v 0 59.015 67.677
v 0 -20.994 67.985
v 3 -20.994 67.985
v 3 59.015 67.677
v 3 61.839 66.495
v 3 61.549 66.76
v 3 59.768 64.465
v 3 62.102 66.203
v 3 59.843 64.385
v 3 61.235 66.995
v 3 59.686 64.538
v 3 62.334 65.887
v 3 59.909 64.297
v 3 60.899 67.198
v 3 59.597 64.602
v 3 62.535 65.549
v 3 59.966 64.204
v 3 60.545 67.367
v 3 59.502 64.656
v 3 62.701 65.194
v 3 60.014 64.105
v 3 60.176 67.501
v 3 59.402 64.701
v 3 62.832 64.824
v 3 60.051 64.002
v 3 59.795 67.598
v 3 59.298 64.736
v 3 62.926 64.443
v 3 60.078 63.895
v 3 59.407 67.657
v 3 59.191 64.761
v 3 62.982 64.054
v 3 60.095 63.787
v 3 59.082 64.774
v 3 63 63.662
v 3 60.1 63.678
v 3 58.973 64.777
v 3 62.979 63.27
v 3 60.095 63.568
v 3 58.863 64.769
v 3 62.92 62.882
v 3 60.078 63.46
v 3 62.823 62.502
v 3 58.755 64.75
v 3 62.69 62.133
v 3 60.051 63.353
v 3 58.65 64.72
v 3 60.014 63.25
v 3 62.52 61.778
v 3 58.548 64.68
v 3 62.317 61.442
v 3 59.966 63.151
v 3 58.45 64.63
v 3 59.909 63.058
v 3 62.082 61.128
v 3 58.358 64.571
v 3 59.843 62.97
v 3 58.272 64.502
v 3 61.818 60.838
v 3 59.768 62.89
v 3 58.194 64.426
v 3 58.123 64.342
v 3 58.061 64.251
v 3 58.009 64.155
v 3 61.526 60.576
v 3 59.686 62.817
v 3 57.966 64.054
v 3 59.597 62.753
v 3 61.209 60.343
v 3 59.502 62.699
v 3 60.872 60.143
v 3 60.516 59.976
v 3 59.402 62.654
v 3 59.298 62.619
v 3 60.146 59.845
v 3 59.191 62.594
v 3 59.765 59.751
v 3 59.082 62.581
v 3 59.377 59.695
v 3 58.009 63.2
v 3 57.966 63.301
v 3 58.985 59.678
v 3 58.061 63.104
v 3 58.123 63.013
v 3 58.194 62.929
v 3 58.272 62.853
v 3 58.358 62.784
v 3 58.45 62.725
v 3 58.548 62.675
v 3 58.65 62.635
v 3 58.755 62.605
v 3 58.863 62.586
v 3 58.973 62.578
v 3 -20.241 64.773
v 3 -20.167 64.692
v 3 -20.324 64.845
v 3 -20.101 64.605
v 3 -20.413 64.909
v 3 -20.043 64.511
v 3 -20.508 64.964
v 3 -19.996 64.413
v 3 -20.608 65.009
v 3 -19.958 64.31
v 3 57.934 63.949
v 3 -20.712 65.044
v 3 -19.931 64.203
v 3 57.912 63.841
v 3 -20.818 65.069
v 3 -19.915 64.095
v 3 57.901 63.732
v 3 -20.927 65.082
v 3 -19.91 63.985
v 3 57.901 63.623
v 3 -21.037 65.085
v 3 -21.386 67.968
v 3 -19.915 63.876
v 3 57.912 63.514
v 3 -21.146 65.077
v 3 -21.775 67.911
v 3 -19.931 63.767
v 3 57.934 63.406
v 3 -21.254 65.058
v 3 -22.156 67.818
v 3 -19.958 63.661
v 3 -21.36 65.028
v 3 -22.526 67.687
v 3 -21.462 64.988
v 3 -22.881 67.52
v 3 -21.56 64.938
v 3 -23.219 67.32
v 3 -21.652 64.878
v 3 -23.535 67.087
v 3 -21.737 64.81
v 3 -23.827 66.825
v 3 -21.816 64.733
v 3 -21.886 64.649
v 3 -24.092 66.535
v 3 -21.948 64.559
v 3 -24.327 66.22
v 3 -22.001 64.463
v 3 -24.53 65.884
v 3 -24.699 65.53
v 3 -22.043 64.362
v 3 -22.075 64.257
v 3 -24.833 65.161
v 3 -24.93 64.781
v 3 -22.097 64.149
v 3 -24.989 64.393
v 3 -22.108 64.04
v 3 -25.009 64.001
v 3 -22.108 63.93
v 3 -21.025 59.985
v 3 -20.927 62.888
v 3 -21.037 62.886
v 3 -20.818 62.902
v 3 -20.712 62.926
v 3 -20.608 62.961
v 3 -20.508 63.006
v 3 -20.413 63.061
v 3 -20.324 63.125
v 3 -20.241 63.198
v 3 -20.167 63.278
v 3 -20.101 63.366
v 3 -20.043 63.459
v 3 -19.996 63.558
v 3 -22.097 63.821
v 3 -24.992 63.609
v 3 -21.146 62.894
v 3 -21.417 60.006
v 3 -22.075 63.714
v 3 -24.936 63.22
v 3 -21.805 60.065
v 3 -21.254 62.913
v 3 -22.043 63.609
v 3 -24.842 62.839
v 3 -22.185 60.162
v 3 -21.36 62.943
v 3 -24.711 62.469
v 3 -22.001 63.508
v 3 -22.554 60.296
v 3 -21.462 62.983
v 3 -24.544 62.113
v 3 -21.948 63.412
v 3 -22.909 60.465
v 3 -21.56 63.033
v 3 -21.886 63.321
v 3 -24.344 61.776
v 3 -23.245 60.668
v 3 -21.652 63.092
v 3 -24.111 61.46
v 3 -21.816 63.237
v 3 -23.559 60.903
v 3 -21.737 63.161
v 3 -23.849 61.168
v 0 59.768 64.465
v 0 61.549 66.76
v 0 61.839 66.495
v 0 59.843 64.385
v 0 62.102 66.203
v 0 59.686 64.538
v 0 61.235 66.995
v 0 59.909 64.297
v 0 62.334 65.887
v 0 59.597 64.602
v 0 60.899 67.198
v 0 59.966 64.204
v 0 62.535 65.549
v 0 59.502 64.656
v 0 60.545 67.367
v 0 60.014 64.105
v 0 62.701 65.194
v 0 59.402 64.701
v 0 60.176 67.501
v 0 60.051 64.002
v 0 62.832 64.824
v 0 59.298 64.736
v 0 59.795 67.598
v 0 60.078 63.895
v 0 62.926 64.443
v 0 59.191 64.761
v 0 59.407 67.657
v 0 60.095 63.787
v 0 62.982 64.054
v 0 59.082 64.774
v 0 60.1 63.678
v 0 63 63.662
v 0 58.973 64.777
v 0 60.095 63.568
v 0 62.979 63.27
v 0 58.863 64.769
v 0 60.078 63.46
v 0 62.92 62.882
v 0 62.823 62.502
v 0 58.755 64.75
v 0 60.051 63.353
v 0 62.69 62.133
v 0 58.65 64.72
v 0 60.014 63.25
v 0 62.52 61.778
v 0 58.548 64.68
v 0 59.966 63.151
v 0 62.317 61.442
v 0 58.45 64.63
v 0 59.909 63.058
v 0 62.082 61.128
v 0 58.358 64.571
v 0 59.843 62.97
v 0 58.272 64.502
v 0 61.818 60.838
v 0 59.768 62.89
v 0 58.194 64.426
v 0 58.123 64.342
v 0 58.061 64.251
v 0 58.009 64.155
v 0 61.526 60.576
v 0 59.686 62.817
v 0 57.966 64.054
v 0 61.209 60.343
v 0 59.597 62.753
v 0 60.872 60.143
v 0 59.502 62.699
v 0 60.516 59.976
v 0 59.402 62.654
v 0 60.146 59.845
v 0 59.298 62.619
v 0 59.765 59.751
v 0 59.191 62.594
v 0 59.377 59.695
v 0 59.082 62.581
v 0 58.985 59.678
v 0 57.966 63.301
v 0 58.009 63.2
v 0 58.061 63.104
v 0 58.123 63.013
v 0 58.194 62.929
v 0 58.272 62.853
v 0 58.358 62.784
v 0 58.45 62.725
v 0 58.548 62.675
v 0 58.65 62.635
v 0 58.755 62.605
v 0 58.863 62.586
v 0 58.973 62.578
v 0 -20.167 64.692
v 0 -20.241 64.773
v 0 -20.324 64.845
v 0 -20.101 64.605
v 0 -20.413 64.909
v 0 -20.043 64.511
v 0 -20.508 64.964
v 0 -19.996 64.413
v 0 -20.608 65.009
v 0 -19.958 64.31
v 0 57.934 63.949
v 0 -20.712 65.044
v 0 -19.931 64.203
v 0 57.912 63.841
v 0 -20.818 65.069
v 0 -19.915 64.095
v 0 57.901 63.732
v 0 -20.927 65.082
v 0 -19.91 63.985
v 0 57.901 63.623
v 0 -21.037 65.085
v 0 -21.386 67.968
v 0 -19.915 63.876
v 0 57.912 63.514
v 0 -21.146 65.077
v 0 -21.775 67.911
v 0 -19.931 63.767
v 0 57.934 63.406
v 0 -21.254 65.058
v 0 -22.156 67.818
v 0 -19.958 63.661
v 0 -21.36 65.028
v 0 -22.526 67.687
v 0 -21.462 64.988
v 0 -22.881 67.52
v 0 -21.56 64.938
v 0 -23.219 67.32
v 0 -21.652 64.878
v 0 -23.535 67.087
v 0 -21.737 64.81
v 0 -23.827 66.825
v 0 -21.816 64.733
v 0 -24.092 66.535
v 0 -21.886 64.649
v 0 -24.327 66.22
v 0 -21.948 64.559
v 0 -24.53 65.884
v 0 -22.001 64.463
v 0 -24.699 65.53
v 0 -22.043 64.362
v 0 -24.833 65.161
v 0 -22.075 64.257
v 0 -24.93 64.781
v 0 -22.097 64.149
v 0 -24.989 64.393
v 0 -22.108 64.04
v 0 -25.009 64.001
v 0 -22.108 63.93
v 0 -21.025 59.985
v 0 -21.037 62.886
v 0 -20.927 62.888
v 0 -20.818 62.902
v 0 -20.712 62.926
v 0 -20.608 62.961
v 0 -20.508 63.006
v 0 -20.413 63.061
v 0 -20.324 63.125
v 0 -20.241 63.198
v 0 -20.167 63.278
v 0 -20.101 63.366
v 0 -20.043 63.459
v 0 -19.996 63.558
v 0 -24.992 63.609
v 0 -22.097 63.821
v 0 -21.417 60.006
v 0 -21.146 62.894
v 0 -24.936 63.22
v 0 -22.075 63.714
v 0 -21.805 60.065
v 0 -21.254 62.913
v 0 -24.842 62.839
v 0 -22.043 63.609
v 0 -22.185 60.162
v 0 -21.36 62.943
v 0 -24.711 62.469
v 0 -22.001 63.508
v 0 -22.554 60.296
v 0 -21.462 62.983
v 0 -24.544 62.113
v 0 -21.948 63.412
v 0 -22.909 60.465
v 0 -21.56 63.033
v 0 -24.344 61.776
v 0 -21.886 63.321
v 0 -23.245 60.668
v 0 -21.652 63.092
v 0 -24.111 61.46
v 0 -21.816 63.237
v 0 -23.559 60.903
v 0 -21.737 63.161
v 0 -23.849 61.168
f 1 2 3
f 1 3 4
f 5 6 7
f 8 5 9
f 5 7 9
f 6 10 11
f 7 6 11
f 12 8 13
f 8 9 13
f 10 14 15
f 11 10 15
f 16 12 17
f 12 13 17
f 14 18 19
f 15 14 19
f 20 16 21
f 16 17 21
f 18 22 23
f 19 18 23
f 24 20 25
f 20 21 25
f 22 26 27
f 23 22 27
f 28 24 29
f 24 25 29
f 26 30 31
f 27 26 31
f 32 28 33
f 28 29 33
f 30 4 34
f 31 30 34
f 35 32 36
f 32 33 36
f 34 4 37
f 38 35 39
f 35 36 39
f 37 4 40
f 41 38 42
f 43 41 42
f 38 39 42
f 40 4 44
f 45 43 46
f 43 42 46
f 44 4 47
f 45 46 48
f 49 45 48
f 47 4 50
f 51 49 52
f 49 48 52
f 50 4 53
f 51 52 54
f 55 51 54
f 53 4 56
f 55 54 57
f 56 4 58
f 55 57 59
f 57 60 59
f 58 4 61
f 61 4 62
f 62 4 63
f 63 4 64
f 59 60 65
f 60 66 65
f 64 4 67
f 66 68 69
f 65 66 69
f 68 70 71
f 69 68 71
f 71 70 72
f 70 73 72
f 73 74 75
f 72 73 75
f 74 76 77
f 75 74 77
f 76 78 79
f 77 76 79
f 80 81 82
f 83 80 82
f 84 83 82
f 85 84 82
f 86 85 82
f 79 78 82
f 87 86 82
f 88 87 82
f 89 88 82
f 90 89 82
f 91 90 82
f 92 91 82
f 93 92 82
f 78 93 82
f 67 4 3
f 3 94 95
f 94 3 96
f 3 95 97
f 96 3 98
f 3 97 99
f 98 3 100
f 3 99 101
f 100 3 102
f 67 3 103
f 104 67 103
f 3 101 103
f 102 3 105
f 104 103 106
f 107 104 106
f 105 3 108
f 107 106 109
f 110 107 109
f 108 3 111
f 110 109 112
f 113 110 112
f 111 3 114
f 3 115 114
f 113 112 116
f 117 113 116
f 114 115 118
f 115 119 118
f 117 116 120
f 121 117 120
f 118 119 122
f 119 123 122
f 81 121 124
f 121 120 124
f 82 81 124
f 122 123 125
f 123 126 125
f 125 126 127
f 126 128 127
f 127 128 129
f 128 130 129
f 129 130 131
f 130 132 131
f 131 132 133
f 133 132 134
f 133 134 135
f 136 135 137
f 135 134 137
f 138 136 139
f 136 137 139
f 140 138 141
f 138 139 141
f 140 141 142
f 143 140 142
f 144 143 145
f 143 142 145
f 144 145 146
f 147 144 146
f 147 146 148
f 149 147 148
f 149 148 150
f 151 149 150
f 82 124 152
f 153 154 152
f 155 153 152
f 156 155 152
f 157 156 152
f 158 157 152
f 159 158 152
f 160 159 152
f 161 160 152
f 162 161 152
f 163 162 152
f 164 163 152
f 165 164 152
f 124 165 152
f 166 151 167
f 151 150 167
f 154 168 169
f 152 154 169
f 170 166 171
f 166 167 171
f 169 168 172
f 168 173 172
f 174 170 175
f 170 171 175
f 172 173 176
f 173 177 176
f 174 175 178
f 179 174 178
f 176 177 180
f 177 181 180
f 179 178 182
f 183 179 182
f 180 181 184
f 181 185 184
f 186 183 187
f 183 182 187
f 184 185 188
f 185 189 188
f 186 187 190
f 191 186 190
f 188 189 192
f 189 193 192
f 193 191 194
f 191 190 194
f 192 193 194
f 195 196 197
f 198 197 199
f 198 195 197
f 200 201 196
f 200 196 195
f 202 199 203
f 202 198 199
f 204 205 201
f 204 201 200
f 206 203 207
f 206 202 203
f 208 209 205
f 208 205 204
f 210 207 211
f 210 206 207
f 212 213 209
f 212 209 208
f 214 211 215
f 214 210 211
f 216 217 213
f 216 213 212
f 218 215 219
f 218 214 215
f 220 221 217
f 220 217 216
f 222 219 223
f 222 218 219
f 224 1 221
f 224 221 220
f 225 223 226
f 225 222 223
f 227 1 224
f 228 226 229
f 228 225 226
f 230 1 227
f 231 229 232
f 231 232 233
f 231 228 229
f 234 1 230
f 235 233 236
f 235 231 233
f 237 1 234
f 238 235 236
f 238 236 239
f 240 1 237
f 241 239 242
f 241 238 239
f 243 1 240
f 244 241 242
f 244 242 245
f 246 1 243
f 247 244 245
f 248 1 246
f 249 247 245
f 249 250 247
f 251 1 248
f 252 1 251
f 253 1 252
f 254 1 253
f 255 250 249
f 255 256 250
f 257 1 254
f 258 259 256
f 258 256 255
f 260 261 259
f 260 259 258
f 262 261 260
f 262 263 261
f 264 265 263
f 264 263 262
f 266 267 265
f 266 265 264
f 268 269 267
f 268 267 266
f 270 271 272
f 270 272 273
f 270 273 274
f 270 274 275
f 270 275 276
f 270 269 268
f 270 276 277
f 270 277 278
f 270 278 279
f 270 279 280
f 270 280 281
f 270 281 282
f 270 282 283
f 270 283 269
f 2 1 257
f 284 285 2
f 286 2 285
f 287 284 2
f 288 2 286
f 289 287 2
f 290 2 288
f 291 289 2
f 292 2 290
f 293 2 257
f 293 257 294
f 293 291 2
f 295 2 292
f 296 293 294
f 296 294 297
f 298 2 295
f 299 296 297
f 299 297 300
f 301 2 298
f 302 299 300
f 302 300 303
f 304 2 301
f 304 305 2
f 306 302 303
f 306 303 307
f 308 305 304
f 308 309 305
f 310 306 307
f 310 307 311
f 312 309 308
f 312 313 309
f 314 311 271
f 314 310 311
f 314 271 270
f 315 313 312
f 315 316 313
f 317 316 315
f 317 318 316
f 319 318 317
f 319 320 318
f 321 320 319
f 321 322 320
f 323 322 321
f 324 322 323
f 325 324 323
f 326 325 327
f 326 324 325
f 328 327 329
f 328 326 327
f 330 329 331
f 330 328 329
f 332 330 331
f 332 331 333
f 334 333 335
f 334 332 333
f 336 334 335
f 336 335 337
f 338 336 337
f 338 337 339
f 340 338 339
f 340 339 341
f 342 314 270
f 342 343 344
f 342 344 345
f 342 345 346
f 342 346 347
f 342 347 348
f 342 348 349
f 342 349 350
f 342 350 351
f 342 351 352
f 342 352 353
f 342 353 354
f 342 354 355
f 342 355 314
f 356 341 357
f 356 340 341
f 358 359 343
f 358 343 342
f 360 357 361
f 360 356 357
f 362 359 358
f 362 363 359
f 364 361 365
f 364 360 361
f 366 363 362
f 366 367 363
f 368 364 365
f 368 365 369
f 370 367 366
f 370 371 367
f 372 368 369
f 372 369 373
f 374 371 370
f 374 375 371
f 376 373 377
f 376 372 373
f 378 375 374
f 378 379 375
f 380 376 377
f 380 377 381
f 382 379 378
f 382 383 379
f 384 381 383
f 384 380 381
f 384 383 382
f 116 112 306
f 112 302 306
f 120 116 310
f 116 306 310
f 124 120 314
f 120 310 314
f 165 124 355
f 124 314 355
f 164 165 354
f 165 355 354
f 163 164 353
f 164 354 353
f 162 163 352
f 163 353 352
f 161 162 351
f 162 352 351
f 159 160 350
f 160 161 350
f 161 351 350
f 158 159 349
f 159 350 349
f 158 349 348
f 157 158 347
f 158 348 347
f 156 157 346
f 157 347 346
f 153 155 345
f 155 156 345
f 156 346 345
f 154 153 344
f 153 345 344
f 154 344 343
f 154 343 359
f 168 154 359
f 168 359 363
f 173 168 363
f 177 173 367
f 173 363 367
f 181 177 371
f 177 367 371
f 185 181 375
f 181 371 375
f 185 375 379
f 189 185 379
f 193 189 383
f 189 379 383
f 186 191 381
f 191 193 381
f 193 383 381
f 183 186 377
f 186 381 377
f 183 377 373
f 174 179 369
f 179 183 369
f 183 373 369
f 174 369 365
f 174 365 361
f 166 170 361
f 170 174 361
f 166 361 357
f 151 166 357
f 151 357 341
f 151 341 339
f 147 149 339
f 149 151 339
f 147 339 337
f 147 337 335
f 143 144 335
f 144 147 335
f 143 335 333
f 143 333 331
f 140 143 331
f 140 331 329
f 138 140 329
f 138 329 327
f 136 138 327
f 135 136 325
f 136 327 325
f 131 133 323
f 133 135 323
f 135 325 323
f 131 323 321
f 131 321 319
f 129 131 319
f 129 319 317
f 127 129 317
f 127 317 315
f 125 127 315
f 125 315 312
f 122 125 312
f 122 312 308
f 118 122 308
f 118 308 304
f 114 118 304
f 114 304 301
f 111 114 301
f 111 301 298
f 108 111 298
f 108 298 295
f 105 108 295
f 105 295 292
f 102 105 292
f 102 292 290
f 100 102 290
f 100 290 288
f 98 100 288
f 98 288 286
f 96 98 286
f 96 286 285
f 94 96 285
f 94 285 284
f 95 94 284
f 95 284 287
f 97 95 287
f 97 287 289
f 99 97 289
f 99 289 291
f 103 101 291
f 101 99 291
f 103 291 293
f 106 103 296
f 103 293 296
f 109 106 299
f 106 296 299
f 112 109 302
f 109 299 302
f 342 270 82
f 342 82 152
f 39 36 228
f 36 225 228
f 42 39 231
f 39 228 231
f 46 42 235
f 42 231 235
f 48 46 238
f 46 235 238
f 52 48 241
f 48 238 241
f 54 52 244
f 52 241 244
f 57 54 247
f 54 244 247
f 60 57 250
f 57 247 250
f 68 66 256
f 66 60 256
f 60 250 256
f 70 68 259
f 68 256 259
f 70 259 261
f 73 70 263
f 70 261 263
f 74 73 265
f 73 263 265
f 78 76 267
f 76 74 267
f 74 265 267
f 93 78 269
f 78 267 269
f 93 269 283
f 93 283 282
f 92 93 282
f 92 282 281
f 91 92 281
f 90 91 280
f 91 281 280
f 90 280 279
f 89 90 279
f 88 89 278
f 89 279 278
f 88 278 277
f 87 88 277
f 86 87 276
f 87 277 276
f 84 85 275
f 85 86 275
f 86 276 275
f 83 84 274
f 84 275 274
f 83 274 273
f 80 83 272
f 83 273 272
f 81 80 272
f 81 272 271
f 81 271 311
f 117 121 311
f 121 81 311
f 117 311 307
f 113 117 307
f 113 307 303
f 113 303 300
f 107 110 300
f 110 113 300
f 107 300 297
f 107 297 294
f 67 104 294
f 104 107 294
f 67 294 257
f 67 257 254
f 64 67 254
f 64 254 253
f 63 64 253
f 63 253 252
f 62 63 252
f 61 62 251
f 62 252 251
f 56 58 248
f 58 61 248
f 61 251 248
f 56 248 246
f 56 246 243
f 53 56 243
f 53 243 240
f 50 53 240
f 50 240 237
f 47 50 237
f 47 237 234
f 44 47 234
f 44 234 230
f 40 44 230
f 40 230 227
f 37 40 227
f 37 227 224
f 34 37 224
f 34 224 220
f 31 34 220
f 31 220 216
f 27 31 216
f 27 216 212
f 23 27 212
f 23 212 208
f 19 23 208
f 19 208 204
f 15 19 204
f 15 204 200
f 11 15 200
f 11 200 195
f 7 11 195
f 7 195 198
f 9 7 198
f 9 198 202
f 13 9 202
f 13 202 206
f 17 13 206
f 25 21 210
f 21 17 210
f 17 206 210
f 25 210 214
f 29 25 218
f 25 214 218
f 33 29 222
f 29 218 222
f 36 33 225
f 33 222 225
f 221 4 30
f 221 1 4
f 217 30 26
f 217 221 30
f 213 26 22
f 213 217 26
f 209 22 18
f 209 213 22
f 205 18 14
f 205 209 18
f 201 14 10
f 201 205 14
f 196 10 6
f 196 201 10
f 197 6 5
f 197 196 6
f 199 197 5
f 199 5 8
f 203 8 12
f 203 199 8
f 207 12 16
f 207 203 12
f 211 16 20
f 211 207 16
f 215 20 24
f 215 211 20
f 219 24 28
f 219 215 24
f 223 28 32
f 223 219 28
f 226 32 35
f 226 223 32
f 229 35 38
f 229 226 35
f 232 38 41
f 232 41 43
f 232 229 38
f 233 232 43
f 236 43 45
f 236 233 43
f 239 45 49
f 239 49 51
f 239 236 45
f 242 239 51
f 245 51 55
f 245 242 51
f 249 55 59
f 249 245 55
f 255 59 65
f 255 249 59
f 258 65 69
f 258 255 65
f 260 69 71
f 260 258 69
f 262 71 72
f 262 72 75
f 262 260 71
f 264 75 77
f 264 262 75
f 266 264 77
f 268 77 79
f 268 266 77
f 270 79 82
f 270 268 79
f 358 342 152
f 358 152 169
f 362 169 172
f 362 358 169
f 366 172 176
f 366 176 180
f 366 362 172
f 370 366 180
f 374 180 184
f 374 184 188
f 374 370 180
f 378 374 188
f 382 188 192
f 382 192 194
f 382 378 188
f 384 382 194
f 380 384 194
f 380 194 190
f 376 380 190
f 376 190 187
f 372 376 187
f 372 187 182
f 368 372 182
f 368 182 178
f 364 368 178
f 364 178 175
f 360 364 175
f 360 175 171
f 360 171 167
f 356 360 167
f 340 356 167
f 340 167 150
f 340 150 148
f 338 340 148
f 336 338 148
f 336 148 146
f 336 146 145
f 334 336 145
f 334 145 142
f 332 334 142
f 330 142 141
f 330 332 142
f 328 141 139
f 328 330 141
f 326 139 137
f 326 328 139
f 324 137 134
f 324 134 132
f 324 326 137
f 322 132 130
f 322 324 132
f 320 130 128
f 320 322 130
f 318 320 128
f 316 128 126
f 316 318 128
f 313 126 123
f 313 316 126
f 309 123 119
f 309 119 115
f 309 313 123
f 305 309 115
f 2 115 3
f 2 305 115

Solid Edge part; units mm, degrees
sketch "Sketch1" plane through (0, 0, 0) normal (1, 0, 0) x (0, 1, 0)
  line L0 (58.9846, 59.6775) -> (-21.0249, 59.9853)
  line L1 (-20.9941, 67.9853) -> (59.0154, 67.6774)
  arc A0 (-21.0249, 59.9853) -> (-20.9941, 67.9853) centre (-21.0095, 63.9853) cw
  arc A1 (59.0154, 67.6775) -> (58.9846, 59.6775) centre (59, 63.6775) cw
  circle A2 centre (-21.0095, 63.9853) radius 1.1
  circle A3 centre (59, 63.6775) radius 1.1
extrude "Protrusion1" add sketch "Sketch1" along normal blind 3
